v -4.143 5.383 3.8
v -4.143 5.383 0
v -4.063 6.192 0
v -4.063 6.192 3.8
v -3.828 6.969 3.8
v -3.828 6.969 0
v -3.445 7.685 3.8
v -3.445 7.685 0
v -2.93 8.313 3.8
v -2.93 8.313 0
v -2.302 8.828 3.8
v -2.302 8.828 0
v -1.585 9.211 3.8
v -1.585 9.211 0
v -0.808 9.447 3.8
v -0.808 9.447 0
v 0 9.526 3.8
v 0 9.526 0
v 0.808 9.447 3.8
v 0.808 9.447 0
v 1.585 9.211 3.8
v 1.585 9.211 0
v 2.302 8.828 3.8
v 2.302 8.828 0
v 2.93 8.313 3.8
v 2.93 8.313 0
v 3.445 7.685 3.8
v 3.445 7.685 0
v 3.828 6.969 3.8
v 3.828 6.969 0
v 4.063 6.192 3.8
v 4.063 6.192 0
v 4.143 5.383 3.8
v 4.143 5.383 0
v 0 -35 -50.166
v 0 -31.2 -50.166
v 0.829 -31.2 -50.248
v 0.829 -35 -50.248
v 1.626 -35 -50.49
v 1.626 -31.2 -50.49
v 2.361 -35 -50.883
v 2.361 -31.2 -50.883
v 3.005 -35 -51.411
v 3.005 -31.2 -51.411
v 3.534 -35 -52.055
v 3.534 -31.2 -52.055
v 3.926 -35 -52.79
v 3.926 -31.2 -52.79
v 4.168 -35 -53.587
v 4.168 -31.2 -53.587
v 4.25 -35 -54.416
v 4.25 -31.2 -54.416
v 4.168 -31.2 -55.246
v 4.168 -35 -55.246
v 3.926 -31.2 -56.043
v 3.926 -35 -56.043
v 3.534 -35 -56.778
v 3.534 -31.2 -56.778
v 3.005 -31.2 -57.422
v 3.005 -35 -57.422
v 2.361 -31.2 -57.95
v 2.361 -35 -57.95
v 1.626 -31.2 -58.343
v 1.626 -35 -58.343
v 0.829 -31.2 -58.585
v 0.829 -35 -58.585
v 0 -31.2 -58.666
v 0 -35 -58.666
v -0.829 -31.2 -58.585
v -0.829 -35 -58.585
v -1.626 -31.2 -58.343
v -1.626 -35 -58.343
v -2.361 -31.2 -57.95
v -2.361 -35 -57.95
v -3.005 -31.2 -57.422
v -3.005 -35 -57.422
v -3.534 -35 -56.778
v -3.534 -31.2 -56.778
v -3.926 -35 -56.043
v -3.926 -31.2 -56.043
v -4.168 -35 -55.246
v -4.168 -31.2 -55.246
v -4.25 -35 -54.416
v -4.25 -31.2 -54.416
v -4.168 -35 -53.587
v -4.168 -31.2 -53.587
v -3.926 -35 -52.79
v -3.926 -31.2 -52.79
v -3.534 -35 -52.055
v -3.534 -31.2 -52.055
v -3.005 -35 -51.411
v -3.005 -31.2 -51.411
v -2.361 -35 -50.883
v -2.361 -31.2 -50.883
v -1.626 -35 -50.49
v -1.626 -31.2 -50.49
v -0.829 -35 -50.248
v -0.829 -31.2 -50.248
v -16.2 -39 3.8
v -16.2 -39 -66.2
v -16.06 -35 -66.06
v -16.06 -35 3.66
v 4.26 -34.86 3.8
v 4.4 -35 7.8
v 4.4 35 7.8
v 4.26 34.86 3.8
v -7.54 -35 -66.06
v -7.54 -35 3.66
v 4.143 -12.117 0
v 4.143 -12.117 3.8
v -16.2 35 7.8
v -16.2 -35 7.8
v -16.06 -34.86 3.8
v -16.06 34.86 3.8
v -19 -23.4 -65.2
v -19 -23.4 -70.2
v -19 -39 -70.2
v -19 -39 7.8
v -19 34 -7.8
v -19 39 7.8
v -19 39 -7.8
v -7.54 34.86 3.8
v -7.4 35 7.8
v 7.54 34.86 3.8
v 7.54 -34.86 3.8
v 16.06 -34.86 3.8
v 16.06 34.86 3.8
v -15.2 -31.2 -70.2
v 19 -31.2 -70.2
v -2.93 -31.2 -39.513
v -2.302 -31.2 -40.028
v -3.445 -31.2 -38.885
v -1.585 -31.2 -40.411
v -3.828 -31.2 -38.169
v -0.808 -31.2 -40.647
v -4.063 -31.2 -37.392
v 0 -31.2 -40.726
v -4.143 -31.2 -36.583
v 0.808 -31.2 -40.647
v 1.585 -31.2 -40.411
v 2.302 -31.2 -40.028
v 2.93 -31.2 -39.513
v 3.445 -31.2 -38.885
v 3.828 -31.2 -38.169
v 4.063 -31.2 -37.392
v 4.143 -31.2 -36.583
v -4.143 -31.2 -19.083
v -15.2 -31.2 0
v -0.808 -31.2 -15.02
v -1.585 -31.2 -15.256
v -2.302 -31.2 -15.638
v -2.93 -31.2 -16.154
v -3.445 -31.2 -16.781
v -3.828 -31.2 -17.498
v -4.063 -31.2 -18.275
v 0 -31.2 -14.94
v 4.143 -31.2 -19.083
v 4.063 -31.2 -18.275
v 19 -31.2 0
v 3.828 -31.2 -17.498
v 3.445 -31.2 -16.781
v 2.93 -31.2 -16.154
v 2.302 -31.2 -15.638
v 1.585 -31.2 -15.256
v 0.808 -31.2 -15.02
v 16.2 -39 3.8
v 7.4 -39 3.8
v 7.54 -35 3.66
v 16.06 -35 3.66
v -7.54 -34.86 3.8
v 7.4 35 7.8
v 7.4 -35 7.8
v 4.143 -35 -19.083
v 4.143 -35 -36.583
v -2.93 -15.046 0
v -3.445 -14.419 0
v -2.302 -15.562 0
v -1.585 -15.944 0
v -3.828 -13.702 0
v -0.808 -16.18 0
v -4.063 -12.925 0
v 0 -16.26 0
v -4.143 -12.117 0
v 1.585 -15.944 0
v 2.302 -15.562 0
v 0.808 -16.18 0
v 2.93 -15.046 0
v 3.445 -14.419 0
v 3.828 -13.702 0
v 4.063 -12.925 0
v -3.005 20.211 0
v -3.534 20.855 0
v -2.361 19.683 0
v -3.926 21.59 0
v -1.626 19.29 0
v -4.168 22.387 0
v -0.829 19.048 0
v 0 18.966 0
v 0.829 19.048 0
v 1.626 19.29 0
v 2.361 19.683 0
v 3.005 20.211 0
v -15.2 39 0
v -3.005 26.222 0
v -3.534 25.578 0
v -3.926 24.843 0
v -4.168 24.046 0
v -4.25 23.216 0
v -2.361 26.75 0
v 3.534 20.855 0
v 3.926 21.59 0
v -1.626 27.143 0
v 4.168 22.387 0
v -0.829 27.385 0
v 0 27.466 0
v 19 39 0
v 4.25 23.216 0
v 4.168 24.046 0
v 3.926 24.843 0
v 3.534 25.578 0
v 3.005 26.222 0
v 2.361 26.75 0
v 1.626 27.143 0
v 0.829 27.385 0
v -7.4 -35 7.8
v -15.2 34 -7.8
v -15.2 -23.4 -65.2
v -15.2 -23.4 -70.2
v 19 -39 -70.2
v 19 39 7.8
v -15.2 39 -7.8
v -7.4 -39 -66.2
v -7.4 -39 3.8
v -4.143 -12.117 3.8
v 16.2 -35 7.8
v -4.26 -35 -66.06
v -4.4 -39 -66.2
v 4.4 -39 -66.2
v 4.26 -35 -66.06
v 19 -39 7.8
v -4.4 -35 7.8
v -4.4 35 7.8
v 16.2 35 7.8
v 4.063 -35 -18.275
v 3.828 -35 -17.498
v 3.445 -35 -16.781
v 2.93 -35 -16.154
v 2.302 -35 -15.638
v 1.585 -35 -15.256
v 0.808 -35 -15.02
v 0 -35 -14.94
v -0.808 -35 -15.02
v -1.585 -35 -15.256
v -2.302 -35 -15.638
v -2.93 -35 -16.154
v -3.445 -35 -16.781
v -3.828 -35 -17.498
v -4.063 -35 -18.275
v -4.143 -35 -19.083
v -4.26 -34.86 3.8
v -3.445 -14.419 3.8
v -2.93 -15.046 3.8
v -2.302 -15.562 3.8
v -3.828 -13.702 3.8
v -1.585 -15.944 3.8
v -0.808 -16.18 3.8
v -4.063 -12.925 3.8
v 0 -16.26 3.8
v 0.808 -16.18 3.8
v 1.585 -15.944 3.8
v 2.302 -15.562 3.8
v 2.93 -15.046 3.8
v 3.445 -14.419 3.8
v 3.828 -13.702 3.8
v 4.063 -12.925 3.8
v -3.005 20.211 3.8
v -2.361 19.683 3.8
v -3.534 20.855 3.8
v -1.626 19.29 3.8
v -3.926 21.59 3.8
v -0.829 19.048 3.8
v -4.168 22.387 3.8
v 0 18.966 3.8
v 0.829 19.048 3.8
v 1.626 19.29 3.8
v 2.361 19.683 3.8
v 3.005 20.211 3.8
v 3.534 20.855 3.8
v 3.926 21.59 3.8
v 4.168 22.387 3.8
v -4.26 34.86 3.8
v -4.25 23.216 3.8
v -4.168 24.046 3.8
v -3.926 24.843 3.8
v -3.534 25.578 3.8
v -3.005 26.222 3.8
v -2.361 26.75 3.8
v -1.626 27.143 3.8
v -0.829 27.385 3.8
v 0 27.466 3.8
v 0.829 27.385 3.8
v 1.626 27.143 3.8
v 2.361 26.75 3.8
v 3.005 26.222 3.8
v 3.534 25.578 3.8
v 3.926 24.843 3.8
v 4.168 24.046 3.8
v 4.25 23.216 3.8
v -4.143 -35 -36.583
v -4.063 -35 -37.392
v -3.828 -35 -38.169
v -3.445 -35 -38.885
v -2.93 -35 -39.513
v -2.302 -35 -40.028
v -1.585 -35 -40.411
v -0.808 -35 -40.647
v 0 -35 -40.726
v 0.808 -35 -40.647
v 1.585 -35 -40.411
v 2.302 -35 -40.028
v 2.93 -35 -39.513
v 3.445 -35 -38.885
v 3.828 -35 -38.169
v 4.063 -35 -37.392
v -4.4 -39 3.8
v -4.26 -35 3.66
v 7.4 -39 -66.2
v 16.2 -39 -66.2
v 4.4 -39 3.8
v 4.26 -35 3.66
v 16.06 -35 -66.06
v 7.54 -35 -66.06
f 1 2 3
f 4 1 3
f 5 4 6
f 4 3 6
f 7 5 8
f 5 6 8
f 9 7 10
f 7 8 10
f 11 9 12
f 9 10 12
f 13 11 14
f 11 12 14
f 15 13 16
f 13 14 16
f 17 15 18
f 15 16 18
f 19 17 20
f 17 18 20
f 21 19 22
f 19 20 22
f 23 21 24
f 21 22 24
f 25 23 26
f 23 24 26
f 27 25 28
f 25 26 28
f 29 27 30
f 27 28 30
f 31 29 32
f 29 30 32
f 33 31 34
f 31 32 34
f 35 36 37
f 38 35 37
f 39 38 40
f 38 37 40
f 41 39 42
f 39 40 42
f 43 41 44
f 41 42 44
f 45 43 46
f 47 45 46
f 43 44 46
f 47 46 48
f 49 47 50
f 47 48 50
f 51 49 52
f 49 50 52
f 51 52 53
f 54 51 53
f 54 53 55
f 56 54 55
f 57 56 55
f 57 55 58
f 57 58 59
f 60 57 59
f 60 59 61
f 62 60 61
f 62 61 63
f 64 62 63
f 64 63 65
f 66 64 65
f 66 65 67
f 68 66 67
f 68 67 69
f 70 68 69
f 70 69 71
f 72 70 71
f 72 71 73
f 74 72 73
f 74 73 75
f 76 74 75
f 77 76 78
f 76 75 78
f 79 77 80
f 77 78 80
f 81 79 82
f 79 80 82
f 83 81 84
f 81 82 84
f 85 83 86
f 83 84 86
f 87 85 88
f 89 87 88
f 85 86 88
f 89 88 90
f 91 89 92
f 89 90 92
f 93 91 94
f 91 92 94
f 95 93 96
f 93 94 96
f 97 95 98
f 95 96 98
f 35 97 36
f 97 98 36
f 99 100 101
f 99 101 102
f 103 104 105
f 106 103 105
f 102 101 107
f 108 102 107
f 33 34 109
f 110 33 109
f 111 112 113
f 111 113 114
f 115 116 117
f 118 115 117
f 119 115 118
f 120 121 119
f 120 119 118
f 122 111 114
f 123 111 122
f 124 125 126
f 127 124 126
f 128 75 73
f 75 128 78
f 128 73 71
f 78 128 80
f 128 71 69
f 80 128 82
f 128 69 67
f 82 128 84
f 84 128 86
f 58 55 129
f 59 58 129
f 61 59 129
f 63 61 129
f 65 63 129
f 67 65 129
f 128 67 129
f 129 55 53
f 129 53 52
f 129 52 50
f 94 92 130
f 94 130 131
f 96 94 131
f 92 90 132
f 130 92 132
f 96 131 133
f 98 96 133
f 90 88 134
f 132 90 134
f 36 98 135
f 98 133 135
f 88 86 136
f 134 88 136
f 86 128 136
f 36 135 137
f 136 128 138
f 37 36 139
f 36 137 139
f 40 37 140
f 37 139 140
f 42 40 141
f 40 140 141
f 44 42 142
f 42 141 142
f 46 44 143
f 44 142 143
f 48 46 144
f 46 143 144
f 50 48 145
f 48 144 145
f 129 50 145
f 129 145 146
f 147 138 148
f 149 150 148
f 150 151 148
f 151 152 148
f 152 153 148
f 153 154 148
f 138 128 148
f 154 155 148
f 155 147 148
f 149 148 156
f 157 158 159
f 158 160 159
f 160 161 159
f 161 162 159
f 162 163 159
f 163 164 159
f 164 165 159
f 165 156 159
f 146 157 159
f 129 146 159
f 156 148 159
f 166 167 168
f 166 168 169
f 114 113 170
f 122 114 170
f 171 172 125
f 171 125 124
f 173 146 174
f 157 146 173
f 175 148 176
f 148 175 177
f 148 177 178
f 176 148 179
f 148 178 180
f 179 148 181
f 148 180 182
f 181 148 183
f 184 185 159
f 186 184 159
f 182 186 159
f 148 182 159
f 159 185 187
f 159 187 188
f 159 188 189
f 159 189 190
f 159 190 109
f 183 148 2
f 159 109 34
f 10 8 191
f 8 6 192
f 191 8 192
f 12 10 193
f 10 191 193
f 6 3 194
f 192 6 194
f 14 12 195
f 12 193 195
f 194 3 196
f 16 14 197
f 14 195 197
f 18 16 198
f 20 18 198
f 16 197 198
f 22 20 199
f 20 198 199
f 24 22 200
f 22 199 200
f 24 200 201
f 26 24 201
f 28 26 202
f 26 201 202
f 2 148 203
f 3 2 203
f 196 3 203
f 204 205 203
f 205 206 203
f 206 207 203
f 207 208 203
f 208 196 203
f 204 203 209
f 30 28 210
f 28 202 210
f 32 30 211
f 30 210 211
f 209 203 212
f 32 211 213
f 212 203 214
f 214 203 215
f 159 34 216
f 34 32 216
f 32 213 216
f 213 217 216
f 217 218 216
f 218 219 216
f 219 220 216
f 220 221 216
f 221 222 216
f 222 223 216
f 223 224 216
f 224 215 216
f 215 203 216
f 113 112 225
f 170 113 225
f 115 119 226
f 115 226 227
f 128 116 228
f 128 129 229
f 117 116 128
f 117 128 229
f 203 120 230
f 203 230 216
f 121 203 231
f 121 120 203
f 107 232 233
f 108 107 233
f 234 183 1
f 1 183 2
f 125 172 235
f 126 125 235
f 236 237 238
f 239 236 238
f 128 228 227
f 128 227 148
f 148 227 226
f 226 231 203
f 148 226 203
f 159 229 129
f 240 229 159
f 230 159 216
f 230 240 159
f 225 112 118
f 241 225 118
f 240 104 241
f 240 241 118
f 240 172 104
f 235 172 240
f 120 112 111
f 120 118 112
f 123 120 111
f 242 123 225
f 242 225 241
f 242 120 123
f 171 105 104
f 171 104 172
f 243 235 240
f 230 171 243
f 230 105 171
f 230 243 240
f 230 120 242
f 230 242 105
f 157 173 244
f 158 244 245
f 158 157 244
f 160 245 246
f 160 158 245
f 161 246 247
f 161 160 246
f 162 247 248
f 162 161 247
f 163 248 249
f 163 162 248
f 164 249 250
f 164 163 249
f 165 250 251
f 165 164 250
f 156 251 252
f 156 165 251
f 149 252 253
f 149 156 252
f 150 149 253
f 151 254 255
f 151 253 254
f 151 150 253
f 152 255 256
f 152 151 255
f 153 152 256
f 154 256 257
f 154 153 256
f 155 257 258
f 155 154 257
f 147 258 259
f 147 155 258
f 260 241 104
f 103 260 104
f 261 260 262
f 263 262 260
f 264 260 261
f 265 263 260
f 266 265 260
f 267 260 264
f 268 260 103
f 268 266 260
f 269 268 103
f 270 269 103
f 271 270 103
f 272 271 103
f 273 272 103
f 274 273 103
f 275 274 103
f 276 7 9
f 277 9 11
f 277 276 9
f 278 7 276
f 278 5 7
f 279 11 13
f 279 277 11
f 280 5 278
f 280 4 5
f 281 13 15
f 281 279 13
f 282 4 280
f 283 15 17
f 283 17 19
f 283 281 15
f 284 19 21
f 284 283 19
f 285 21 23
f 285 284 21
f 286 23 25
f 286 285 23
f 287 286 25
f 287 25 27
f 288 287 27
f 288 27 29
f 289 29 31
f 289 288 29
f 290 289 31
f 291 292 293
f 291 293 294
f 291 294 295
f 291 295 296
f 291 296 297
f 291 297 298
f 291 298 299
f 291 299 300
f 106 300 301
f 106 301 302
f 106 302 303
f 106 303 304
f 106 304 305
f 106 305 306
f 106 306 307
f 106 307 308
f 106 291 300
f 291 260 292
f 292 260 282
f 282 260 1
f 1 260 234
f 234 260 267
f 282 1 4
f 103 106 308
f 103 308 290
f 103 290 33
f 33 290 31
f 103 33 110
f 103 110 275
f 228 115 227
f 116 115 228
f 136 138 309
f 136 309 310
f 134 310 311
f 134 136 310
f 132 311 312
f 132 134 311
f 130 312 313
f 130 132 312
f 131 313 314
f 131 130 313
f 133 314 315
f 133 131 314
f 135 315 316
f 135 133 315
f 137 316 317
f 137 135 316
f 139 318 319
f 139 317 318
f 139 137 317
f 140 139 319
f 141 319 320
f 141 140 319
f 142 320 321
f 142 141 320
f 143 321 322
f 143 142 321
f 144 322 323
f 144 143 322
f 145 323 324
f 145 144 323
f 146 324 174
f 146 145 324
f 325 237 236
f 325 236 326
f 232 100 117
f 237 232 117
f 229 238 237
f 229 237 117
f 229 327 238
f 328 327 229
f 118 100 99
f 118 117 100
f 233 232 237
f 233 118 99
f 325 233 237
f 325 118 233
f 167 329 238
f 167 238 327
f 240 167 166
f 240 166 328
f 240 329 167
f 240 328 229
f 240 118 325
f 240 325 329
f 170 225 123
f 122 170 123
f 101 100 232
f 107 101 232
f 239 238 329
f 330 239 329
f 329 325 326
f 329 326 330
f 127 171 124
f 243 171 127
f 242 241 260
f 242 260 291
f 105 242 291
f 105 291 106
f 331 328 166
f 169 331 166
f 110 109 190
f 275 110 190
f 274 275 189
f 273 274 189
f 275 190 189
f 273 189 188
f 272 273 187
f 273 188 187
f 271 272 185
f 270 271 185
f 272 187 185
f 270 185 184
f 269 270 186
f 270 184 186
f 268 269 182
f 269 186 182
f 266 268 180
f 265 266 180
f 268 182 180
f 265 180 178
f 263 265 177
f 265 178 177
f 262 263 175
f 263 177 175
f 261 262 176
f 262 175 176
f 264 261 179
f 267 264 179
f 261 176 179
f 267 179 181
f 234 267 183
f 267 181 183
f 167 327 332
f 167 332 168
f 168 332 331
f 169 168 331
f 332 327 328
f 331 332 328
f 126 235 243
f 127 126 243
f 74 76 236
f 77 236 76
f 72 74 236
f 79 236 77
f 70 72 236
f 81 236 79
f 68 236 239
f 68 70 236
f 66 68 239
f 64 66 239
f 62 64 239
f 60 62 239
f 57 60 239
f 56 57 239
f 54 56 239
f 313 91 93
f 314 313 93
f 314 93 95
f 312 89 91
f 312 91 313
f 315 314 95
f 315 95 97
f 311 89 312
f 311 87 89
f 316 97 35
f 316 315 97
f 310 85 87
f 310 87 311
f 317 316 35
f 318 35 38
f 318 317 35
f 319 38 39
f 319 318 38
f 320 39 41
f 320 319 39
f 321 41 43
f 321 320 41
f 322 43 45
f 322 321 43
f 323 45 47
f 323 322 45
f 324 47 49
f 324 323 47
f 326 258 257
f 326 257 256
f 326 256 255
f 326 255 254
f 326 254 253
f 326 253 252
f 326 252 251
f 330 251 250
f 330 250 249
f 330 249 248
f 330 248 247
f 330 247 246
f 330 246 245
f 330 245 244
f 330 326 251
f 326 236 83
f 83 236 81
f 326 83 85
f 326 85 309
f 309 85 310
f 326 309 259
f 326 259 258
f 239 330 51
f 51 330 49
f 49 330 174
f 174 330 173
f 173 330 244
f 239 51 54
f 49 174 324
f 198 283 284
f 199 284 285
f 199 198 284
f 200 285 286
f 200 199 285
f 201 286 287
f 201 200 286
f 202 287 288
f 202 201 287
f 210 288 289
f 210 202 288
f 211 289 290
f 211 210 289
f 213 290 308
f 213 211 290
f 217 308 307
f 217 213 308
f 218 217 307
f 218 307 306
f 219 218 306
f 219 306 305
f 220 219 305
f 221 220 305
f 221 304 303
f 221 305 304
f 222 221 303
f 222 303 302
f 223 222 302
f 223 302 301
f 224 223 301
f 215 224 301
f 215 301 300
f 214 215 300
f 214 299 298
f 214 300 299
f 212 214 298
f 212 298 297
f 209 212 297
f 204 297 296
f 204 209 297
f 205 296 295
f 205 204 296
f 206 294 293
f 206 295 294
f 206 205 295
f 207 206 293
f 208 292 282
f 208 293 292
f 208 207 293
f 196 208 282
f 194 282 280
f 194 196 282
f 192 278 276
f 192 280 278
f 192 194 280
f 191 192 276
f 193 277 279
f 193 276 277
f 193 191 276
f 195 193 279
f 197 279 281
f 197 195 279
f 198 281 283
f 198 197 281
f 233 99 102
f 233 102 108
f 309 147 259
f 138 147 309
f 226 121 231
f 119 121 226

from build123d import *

# Parameters (mm, degrees)
SKETCH_1_W                    = 38
SKETCH_1_H                    = 78
EXTRUDE_1_DEPTH               = 7.8
SKETCH_3_W                    = 38
SKETCH_3_H                    = 7.8
EXTRUDE_2_DEPTH               = 78
EXTRUDE_3_DEPTH               = 3.8
SKETCH_5_R                    = 4.25
CUT_EXTRUDE_1_DEPTH           = 102.079572615
SKETCH_6_W                    = 8.8
SKETCH_6_H                    = 70
CUT_EXTRUDE_2_DEPTH           = 4
CUT_EXTRUDE_2_DRAFT           = -2
CUT_EXTRUDE_2_PROFILE_2_DEPTH = 4
CUT_EXTRUDE_2_PROFILE_2_DRAFT = -2
CUT_EXTRUDE_2_PROFILE_3_DEPTH = 4
CUT_EXTRUDE_2_PROFILE_3_DRAFT = -2
SKETCH_7_W                    = 8.8
SKETCH_7_H                    = 70
CUT_EXTRUDE_3_DEPTH           = 4
CUT_EXTRUDE_3_DRAFT           = -2
CUT_EXTRUDE_3_PROFILE_2_DEPTH = 4
CUT_EXTRUDE_3_PROFILE_2_DRAFT = -2
CUT_EXTRUDE_3_PROFILE_3_DEPTH = 4
CUT_EXTRUDE_3_PROFILE_3_DRAFT = -2


with BuildPart() as part:
    # 草图1 → 凸台-拉伸1 (new body)
    with BuildSketch(Plane.XY):
        Rectangle(SKETCH_1_W, SKETCH_1_H)
    extrude(amount=EXTRUDE_1_DEPTH)

    # 草图3 → 凸台-拉伸2 (add)
    with BuildSketch(Plane.XY.offset(7.8)):
        with Locations((0, -35.1)):
            Rectangle(SKETCH_3_W, SKETCH_3_H)
    extrude(amount=-EXTRUDE_2_DEPTH)

    # 草图4 → 凸台-拉伸3 (add)
    with BuildSketch(Plane.ZY.offset(19)):
        Polygon((0, 39), (-7.8, 39), (-7.8, 34), (-65.2, -23.4), (-70.2, -23.4), (-70.2, -31.2), (0, -31.2), align=None)
    extrude(amount=-EXTRUDE_3_DEPTH)

    # 草图5 → 切除-拉伸1 (cut, through all)
    with BuildSketch(Plane(origin=(0, -31.2, 0), x_dir=(1, 0, 0), z_dir=(0, 1, 0))):
        with Locations(Location((0, 54.416495981, 0), (0, 0, 270))):
            Circle(SKETCH_5_R)
        with BuildLine():
            Line((-4.1430597, 19.083232121), (-4.1430597, 36.583232121))
            ThreePointArc((-4.1430597, 36.583232121), (0, 40.726291822), (4.1430597, 36.583232121))
            Line((4.1430597, 36.583232121), (4.1430597, 19.083232121))
            ThreePointArc((4.1430597, 19.083232121), (0, 14.940172421), (-4.1430597, 19.083232121))
        make_face()
    cut_extrude_1 = extrude(amount=-CUT_EXTRUDE_1_DEPTH, mode=Mode.SUBTRACT)

    # 镜向1: 切除-拉伸1 across plane
    add(cut_extrude_1.mirror(Plane(origin=(0, -15.6, -15.6), x_dir=(0, -0.7071067811865478, 0.7071067811865474), z_dir=(0, 0.7071067811865472, 0.7071067811865478))), mode=Mode.SUBTRACT)


with BuildPart() as cut_extrude_2_tool:
    # 草图6 → 切除-拉伸2 (with draft: the straight prism first)
    with BuildSketch(Plane.XZ.offset(39)):
        with Locations((-11.8, -31.2)):
            Rectangle(SKETCH_6_W, SKETCH_6_H)
    extrude(amount=-CUT_EXTRUDE_2_DEPTH)
    # 切除-拉伸2: the draft: its side faces are tilted about the plane it starts from
    cut_extrude_2_sides = [cut_extrude_2_tool.faces().sort_by_distance(p)[0] for p in [
        (-16.2, -37, -31.2),
        (-11.8, -37, -66.2),
        (-7.4, -37, -31.2),
        (-11.8, -37, 3.8),
    ]]
    draft(cut_extrude_2_sides, Plane.XZ.offset(39), CUT_EXTRUDE_2_DRAFT)


with BuildPart() as part_1:
    add(part.part)

    # 切除-拉伸2: cut by cut_extrude_2_tool
    add(cut_extrude_2_tool.part, mode=Mode.SUBTRACT)


with BuildPart() as cut_extrude_2_profile_2_tool:
    # 草图6 → 切除-拉伸2 profile 2 (with draft: the straight prism first)
    with BuildSketch(Plane.XZ.offset(39)):
        with Locations((0, -31.2)):
            Rectangle(SKETCH_6_W, SKETCH_6_H)
    extrude(amount=-CUT_EXTRUDE_2_PROFILE_2_DEPTH)
    # 切除-拉伸2 profile 2: the draft: its side faces are tilted about the plane it starts from
    cut_extrude_2_profile_2_sides = [cut_extrude_2_profile_2_tool.faces().sort_by_distance(p)[0] for p in [
        (-4.4, -37, -31.2),
        (0, -37, -66.2),
        (4.4, -37, -31.2),
        (0, -37, 3.8),
    ]]
    draft(cut_extrude_2_profile_2_sides, Plane.XZ.offset(39), CUT_EXTRUDE_2_PROFILE_2_DRAFT)


with BuildPart() as part_2:
    add(part_1.part)

    # 切除-拉伸2 profile 2: cut by cut_extrude_2_profile_2_tool
    add(cut_extrude_2_profile_2_tool.part, mode=Mode.SUBTRACT)


with BuildPart() as cut_extrude_2_profile_3_tool:
    # 草图6 → 切除-拉伸2 profile 3 (with draft: the straight prism first)
    with BuildSketch(Plane.XZ.offset(39)):
        with Locations((11.8, -31.2)):
            Rectangle(SKETCH_6_W, SKETCH_6_H)
    extrude(amount=-CUT_EXTRUDE_2_PROFILE_3_DEPTH)
    # 切除-拉伸2 profile 3: the draft: its side faces are tilted about the plane it starts from
    cut_extrude_2_profile_3_sides = [cut_extrude_2_profile_3_tool.faces().sort_by_distance(p)[0] for p in [
        (7.4, -37, -31.2),
        (11.8, -37, -66.2),
        (16.2, -37, -31.2),
        (11.8, -37, 3.8),
    ]]
    draft(cut_extrude_2_profile_3_sides, Plane.XZ.offset(39), CUT_EXTRUDE_2_PROFILE_3_DRAFT)


with BuildPart() as part_3:
    add(part_2.part)

    # 切除-拉伸2 profile 3: cut by cut_extrude_2_profile_3_tool
    add(cut_extrude_2_profile_3_tool.part, mode=Mode.SUBTRACT)


with BuildPart() as cut_extrude_3_tool:
    # 草图7 → 切除-拉伸3 (with draft: the straight prism first)
    with BuildSketch(Plane.XY.offset(7.8)):
        Rectangle(SKETCH_7_W, SKETCH_7_H)
    extrude(amount=-CUT_EXTRUDE_3_DEPTH)
    # 切除-拉伸3: the draft: its side faces are tilted about the plane it starts from
    cut_extrude_3_sides = [cut_extrude_3_tool.faces().sort_by_distance(p)[0] for p in [
        (-4.4, 0, 5.8),
        (0, -35, 5.8),
        (4.4, 0, 5.8),
        (0, 35, 5.8),
    ]]
    draft(cut_extrude_3_sides, Plane.XY.offset(7.8), CUT_EXTRUDE_3_DRAFT)


with BuildPart() as part_4:
    add(part_3.part)

    # 切除-拉伸3: cut by cut_extrude_3_tool
    add(cut_extrude_3_tool.part, mode=Mode.SUBTRACT)


with BuildPart() as cut_extrude_3_profile_2_tool:
    # 草图7 → 切除-拉伸3 profile 2 (with draft: the straight prism first)
    with BuildSketch(Plane.XY.offset(7.8)):
        with Locations((-11.8, 0)):
            Rectangle(SKETCH_7_W, SKETCH_7_H)
    extrude(amount=-CUT_EXTRUDE_3_PROFILE_2_DEPTH)
    # 切除-拉伸3 profile 2: the draft: its side faces are tilted about the plane it starts from
    cut_extrude_3_profile_2_sides = [cut_extrude_3_profile_2_tool.faces().sort_by_distance(p)[0] for p in [
        (-16.2, 0, 5.8),
        (-11.8, -35, 5.8),
        (-7.4, 0, 5.8),
        (-11.8, 35, 5.8),
    ]]
    draft(cut_extrude_3_profile_2_sides, Plane.XY.offset(7.8), CUT_EXTRUDE_3_PROFILE_2_DRAFT)


with BuildPart() as part_5:
    add(part_4.part)

    # 切除-拉伸3 profile 2: cut by cut_extrude_3_profile_2_tool
    add(cut_extrude_3_profile_2_tool.part, mode=Mode.SUBTRACT)


with BuildPart() as cut_extrude_3_profile_3_tool:
    # 草图7 → 切除-拉伸3 profile 3 (with draft: the straight prism first)
    with BuildSketch(Plane.XY.offset(7.8)):
        with Locations((11.8, 0)):
            Rectangle(SKETCH_7_W, SKETCH_7_H)
    extrude(amount=-CUT_EXTRUDE_3_PROFILE_3_DEPTH)
    # 切除-拉伸3 profile 3: the draft: its side faces are tilted about the plane it starts from
    cut_extrude_3_profile_3_sides = [cut_extrude_3_profile_3_tool.faces().sort_by_distance(p)[0] for p in [
        (7.4, 0, 5.8),
        (11.8, -35, 5.8),
        (16.2, 0, 5.8),
        (11.8, 35, 5.8),
    ]]
    draft(cut_extrude_3_profile_3_sides, Plane.XY.offset(7.8), CUT_EXTRUDE_3_PROFILE_3_DRAFT)


with BuildPart() as part_6:
    add(part_5.part)

    # 切除-拉伸3 profile 3: cut by cut_extrude_3_profile_3_tool
    add(cut_extrude_3_profile_3_tool.part, mode=Mode.SUBTRACT)


solid = part_6.part
